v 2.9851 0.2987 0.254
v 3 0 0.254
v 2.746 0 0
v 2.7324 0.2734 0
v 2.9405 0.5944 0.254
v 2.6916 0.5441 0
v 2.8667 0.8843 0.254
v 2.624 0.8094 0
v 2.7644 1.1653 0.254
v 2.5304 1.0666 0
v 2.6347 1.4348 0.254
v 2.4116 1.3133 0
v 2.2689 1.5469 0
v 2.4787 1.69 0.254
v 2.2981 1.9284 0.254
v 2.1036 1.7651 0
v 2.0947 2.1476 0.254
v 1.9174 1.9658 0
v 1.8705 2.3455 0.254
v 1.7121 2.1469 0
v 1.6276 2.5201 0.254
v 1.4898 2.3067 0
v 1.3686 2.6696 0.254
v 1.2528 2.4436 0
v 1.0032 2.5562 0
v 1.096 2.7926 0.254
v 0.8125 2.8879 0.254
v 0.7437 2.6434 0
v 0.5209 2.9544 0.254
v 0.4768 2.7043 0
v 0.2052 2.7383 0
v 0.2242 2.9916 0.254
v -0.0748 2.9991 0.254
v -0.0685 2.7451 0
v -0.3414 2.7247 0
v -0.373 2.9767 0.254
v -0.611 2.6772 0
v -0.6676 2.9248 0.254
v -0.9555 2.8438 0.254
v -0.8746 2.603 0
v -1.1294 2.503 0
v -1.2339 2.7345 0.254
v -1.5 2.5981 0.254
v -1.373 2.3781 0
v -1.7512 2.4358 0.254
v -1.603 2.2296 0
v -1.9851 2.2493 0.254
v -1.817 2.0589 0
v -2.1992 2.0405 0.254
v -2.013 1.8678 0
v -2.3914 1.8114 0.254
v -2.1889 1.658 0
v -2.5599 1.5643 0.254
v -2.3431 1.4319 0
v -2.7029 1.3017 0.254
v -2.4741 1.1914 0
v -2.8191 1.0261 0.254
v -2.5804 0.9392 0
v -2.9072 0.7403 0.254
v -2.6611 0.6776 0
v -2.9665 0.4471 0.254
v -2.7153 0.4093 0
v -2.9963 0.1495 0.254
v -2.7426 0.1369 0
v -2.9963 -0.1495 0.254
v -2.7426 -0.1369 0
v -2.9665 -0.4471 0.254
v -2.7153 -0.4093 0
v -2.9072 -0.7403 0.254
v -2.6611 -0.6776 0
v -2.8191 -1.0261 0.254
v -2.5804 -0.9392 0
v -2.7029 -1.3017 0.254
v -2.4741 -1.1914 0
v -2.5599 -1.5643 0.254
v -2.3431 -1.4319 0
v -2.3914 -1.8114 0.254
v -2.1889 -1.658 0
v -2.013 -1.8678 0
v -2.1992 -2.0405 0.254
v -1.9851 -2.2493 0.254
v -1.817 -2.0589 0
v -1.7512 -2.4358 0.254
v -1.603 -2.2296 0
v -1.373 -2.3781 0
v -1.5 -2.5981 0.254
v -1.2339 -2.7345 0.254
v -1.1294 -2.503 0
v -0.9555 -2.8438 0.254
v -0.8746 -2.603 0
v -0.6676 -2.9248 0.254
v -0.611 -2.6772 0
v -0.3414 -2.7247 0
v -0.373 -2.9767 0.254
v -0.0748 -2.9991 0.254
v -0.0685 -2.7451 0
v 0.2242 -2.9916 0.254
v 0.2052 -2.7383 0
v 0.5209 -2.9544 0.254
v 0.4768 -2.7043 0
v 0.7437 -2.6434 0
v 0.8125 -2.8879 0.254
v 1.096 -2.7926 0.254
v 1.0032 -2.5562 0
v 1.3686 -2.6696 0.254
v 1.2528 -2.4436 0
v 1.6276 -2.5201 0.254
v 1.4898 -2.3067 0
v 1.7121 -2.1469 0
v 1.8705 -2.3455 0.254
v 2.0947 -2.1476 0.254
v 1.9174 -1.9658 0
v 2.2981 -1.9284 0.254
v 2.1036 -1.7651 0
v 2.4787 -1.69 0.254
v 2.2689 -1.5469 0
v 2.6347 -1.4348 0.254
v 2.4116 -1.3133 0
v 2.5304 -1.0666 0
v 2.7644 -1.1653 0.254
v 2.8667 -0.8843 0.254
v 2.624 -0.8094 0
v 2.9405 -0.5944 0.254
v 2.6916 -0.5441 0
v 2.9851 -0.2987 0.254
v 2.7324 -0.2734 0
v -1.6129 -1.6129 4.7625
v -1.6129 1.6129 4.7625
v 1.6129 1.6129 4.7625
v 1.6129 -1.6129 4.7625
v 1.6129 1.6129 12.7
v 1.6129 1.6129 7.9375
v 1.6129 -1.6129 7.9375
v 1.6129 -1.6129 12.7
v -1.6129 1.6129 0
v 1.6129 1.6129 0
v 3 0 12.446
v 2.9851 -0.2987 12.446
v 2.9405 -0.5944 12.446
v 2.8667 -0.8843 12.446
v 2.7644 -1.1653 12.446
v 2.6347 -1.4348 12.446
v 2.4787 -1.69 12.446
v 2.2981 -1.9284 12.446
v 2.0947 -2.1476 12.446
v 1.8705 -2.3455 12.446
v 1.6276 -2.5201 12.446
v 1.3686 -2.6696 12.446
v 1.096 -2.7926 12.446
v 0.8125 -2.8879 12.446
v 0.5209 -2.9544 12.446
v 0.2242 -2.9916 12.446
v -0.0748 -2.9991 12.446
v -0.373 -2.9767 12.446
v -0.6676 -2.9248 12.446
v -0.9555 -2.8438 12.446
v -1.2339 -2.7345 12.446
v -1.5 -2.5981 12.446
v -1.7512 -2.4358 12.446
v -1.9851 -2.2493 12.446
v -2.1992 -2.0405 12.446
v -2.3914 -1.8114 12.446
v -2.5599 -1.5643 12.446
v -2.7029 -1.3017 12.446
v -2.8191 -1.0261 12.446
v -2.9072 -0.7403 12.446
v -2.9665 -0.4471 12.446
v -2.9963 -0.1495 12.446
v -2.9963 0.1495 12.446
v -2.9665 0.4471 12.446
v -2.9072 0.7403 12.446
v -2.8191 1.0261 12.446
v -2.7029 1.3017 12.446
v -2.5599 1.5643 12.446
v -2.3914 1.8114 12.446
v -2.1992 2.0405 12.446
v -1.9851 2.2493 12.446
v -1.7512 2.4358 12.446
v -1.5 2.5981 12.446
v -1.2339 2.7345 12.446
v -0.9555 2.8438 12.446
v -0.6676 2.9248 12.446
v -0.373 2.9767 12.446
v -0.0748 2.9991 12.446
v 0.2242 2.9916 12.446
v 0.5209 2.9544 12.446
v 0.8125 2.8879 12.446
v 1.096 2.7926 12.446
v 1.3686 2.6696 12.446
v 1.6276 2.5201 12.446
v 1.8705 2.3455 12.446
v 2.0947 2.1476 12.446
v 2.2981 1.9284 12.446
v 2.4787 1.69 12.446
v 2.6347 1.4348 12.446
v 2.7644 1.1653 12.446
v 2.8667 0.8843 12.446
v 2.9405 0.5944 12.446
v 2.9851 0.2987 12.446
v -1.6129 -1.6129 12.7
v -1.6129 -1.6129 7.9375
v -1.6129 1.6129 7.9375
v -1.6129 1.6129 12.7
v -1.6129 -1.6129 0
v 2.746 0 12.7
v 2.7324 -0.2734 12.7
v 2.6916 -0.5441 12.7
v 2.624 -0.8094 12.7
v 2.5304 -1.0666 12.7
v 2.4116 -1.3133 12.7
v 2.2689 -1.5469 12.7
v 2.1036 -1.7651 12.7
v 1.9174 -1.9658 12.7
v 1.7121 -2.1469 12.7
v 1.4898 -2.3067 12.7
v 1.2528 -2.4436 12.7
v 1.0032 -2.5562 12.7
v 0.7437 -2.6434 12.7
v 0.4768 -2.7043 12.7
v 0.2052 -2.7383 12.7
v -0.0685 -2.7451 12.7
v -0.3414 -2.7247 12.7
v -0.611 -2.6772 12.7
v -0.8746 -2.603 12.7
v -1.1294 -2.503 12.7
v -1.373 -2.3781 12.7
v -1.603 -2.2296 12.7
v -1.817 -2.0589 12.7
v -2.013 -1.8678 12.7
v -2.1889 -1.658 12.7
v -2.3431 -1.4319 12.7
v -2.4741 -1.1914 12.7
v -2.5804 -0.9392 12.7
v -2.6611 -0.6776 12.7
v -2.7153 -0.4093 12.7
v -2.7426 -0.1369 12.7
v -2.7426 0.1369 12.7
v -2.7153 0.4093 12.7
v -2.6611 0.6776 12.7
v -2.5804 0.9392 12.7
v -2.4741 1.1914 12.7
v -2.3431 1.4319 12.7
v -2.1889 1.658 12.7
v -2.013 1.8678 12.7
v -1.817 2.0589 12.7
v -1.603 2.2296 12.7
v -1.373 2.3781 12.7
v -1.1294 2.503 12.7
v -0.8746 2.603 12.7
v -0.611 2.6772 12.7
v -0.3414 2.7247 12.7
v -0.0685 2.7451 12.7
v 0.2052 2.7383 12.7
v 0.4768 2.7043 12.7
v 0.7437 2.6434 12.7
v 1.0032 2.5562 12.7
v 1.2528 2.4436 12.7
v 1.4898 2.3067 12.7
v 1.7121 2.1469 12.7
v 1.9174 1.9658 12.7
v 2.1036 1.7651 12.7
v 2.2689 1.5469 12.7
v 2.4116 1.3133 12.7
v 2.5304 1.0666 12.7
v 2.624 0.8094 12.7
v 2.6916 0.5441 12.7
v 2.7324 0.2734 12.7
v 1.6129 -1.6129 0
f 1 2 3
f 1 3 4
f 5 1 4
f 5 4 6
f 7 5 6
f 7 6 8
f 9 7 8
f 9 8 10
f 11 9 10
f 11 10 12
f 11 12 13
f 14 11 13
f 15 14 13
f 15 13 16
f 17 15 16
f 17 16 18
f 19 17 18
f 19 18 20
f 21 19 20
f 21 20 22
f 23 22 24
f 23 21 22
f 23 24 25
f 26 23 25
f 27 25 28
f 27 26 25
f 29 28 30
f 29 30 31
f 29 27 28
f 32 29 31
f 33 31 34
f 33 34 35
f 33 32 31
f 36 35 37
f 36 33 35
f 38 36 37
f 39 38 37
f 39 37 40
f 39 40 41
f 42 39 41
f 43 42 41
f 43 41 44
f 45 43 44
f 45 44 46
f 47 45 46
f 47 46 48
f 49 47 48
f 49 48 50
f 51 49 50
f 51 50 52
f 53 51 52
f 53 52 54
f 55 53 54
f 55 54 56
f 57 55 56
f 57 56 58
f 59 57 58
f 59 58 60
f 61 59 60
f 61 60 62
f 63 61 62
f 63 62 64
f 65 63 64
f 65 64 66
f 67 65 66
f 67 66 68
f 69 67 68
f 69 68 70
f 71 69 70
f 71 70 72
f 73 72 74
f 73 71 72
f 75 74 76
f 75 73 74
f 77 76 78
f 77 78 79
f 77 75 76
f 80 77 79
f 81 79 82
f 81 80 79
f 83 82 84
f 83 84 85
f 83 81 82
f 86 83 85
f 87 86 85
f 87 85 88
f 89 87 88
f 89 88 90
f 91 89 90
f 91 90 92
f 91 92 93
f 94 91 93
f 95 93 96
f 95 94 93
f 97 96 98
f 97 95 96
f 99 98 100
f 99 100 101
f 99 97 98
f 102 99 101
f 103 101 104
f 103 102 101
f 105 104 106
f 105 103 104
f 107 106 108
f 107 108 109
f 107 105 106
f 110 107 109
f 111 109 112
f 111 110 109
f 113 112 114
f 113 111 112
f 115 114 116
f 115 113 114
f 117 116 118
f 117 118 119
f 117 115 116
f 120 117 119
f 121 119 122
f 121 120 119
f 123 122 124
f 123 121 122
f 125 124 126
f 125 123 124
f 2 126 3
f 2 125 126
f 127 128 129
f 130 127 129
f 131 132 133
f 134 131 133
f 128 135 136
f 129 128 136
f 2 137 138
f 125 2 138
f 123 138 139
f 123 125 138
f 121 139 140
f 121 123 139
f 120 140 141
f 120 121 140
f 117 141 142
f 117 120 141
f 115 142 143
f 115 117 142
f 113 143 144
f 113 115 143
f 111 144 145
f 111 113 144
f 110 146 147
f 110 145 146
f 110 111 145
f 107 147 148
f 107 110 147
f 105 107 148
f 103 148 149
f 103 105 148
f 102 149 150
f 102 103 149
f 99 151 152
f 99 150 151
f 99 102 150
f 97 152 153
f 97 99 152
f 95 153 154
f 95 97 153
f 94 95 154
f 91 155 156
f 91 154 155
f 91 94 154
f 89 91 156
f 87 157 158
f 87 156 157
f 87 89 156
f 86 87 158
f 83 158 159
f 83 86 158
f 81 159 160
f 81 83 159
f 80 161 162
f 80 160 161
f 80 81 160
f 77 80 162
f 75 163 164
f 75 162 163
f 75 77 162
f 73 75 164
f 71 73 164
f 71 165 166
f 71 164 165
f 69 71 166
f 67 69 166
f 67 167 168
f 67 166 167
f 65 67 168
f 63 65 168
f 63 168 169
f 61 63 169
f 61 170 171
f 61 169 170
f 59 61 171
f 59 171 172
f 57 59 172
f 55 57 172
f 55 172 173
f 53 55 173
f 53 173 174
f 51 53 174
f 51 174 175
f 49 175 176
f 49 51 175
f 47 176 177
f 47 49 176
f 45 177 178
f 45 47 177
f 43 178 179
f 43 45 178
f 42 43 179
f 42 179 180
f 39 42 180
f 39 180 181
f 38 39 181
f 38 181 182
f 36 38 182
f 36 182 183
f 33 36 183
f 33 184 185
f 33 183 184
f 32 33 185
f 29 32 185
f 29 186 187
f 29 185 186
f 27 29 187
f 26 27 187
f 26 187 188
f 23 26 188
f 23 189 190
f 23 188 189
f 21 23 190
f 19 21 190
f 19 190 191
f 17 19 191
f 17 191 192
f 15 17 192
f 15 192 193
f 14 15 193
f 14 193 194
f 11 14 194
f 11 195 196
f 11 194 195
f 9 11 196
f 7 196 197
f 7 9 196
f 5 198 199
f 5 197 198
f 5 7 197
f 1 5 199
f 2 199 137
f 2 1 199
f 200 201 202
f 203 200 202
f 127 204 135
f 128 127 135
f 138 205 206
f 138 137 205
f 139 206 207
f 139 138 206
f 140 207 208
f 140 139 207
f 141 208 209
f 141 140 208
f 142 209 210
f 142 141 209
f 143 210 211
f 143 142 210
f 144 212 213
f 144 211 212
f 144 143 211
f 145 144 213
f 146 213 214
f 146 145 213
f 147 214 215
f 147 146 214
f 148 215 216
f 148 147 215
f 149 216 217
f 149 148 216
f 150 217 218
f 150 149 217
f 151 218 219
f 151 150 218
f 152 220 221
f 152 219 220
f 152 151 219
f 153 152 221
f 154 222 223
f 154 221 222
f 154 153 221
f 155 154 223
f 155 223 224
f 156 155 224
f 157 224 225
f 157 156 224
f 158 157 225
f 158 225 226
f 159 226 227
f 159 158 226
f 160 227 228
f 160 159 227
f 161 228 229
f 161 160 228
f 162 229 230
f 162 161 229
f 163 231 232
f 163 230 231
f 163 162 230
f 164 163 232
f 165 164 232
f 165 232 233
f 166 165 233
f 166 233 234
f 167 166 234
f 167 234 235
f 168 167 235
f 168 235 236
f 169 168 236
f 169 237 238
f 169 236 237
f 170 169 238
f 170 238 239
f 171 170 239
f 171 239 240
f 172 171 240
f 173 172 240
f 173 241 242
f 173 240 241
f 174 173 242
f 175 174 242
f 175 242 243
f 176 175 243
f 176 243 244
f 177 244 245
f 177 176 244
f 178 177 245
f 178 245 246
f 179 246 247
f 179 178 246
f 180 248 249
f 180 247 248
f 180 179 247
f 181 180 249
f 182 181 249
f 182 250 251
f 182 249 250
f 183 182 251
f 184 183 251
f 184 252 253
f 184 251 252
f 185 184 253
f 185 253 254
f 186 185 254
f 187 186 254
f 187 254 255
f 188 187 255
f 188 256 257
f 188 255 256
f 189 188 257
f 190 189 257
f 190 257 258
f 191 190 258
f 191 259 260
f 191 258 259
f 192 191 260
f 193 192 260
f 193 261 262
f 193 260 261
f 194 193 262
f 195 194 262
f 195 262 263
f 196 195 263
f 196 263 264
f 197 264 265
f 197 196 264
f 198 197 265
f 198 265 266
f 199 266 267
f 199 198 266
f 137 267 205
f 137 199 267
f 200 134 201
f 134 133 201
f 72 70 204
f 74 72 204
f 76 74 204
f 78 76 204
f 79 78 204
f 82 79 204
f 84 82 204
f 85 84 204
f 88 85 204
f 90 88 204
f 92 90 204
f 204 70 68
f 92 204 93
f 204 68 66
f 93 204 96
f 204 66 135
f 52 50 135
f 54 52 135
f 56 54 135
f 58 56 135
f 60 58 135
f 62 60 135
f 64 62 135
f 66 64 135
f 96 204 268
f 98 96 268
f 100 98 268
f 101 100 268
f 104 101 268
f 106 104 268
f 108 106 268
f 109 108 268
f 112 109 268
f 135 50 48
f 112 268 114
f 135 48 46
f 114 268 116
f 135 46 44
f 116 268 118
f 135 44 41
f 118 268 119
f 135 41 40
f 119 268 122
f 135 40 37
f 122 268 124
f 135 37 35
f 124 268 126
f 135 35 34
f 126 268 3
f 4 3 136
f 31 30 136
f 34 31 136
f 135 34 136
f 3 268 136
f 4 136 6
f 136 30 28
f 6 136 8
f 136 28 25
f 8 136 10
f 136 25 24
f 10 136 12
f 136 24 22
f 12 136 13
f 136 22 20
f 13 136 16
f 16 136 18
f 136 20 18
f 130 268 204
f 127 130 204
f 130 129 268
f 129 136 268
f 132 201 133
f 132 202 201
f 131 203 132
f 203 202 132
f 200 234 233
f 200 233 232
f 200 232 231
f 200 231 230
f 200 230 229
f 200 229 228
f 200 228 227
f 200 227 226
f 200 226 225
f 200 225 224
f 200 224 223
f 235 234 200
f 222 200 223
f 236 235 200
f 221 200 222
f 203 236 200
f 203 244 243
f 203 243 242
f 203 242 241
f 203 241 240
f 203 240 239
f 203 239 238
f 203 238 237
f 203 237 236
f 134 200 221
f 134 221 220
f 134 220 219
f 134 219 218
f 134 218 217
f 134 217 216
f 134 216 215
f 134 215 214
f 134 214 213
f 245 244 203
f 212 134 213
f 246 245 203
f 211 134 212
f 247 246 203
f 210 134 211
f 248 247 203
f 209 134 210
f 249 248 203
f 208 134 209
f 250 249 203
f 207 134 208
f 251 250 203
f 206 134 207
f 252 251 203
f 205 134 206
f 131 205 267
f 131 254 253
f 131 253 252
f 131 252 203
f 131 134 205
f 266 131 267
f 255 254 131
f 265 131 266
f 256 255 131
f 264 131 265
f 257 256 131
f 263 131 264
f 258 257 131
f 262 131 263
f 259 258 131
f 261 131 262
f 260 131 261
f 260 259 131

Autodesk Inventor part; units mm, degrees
ref_plane "YZ Plane" through (0, 0, 0) normal (1, 0, 0) x (0, 1, 0)
ref_plane "XZ Plane" through (0, 0, 0) normal (0, 1, 0) x (-1, 0, 0)
sketch "Sketch1" plane through (0, 0, 0) normal (0, 0, 1) x (1, 0, 0)
  circle A0 centre (0, 0) radius 3
  line L0 (-1.6129, 1.6129) -> (1.6129, 1.6129)
  line L1 (1.6129, 1.6129) -> (1.6129, -1.6129)
  line L2 (1.6129, -1.6129) -> (-1.6129, -1.6129)
  line L3 (-1.6129, -1.6129) -> (-1.6129, 1.6129)
  dimension "d0" = 6
  dimension "d1" = 3.2258
  dimension "d2" = 3.2258
  dimension "d3" = 1.6129
  dimension "d4" = 1.6129
extrude "Extrusion1" add sketch "Sketch1" along normal blind 12.7
ref_plane "Work Plane1" through (0, 0, 6.35) normal (0, 0, 1) x (1, 0, 0)
sketch "Sketch2" plane through (0, 0, 6.35) normal (0, 0, 1) x (1, 0, 0)
  circle A0 centre (0, 0) radius 3 projected
extrude "Extrusion2" add sketch "Sketch2" along normal mid plane 3.175
chamfer "Chamfer1" distance 0.254 angle 45 2 edges at (-3, 0, 0) (-3, 0, 12.7)
equation "\"d3\" = 0.5 * d2"
equation "\"d4\" = 0.5 * d1"
properties part number "Vex Shaft Coupler" material "Steel"
